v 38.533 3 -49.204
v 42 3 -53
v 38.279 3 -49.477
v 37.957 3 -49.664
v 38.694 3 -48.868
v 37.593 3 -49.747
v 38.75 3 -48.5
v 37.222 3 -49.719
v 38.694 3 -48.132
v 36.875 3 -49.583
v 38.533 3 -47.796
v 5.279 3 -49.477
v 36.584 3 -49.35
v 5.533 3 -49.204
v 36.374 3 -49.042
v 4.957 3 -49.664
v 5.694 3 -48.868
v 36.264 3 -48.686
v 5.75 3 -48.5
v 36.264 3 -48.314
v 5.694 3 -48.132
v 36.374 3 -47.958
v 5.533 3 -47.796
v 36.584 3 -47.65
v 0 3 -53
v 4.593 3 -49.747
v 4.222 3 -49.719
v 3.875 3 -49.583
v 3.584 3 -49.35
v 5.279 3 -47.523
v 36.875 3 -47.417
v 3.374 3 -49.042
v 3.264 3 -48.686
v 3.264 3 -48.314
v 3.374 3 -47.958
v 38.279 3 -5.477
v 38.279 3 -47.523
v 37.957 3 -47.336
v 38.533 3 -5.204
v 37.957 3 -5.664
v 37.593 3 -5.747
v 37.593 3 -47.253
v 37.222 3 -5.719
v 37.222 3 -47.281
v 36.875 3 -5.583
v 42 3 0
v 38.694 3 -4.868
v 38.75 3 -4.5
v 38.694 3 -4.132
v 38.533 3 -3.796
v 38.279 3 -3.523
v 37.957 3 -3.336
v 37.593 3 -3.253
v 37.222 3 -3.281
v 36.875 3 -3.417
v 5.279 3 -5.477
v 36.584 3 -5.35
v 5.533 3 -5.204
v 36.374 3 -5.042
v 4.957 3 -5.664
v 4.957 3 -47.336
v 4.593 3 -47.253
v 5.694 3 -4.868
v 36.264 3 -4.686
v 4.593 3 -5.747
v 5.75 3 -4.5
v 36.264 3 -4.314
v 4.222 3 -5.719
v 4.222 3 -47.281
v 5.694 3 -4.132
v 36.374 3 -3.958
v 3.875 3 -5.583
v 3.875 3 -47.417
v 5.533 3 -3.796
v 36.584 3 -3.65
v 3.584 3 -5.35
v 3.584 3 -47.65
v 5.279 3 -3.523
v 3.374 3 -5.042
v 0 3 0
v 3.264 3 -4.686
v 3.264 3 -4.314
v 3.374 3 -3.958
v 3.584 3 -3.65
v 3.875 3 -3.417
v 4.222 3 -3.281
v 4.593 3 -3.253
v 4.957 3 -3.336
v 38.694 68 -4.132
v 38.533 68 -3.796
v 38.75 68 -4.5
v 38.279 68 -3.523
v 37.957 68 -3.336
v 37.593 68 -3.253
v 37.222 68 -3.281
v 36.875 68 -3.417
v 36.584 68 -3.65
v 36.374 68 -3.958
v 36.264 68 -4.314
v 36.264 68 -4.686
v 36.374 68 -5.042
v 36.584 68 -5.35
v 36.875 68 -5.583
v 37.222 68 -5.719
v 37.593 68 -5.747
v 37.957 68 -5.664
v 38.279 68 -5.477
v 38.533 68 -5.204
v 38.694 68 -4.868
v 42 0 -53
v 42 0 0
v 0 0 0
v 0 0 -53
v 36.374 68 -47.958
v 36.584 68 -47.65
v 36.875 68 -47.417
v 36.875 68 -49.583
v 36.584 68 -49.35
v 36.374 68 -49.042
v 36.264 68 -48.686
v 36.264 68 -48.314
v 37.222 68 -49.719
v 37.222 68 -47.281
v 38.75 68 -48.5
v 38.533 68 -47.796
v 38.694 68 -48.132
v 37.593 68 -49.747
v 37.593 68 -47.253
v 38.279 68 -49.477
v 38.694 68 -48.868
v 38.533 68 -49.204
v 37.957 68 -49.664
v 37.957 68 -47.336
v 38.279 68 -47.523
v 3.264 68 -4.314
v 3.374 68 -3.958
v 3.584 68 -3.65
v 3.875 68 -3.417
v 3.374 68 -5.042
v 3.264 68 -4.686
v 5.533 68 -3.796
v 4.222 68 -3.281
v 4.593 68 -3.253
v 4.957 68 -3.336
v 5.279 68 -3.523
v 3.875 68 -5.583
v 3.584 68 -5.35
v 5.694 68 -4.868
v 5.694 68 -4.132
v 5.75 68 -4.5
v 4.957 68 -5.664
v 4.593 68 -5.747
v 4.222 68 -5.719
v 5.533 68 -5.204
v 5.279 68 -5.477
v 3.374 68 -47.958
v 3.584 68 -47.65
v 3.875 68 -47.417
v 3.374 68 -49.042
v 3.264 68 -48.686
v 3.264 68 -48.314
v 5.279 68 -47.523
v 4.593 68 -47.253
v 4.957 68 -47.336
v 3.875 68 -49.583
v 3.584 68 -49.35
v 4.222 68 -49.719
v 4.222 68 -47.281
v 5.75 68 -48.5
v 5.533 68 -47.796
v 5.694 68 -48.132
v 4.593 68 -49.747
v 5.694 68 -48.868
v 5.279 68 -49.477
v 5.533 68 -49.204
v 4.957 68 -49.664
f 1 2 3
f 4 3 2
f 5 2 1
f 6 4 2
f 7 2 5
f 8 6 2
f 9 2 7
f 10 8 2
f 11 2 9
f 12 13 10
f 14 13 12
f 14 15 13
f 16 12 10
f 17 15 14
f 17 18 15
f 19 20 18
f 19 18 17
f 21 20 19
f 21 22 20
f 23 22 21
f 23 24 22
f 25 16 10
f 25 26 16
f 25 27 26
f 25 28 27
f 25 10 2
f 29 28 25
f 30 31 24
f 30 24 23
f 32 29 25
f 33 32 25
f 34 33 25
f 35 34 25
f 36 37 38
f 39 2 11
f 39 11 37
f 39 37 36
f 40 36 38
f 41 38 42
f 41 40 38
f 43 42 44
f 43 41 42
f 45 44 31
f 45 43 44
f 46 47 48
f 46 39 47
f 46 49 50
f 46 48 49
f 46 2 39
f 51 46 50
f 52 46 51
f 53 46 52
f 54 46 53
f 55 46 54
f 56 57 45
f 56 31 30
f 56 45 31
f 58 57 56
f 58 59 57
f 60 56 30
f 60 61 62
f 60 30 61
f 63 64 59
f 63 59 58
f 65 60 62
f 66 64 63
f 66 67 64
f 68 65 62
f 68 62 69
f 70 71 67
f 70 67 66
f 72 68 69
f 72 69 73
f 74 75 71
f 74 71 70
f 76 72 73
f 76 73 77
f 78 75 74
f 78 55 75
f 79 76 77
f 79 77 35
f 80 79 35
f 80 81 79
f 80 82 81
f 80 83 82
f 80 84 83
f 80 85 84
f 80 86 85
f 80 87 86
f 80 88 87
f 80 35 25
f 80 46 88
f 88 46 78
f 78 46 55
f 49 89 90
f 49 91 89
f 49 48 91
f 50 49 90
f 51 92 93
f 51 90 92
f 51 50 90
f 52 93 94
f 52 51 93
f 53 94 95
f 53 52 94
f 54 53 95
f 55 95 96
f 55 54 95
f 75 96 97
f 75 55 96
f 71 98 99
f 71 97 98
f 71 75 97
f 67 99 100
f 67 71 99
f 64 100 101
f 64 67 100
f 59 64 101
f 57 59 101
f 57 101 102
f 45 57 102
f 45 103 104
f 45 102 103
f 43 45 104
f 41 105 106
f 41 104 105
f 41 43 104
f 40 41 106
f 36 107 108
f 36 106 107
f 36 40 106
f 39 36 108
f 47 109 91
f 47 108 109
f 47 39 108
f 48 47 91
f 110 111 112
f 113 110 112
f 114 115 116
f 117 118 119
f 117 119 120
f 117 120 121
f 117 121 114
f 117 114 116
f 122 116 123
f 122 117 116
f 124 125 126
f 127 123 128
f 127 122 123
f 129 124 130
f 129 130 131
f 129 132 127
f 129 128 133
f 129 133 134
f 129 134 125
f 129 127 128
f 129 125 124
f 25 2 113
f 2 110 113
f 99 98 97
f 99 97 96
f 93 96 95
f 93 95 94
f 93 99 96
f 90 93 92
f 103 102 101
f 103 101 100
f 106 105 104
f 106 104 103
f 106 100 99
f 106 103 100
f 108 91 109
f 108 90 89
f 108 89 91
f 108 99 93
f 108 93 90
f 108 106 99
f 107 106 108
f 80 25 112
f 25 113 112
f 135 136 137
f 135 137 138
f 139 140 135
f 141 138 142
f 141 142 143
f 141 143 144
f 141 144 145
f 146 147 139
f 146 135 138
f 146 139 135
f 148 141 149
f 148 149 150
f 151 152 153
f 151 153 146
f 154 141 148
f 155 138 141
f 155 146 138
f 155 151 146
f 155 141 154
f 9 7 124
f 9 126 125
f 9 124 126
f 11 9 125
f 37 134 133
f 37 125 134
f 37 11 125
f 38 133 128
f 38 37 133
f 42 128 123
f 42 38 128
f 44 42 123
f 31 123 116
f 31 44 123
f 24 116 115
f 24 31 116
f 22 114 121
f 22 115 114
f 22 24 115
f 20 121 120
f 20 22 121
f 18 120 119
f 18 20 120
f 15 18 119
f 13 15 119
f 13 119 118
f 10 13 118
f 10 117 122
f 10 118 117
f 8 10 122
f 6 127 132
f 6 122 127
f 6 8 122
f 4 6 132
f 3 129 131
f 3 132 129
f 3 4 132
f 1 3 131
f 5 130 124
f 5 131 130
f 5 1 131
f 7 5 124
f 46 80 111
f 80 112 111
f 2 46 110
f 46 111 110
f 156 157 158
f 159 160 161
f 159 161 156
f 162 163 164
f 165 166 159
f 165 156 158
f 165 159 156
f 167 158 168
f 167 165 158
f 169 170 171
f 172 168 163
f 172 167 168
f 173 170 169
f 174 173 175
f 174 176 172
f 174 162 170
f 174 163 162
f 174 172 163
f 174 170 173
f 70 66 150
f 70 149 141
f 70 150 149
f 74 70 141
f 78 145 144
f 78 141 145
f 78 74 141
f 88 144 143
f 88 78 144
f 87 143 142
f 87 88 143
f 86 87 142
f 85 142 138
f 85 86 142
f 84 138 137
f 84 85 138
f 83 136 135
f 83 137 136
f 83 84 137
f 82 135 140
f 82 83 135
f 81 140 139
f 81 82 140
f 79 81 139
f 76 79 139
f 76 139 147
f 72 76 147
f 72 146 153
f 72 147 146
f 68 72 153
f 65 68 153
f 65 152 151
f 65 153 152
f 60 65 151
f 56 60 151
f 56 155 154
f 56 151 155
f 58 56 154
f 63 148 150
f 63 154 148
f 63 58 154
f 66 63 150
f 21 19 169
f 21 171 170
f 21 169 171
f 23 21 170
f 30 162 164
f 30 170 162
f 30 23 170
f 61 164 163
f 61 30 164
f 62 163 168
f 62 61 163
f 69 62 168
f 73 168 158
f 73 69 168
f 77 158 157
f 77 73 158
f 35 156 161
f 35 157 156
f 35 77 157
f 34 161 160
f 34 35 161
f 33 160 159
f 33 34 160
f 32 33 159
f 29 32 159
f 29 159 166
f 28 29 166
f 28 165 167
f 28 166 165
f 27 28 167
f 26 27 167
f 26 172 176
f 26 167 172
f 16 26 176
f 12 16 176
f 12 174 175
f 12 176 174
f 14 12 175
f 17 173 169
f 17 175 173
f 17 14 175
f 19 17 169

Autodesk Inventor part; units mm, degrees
ref_plane "YZ Plane" through (0, 0, 0) normal (1, 0, 0) x (0, 1, 0)
ref_plane "XZ Plane" through (0, 0, 0) normal (0, 1, 0) x (-1, 0, 0)
ref_plane "XY Plane" through (0, 0, 0) normal (0, 0, 1) x (1, 0, 0)
sketch "Boceto1" plane through (0, 0, 0) normal (0, 1, 0) x (-1, 0, 0)
  line L0 (0, 0) -> (-42, 0)
  line L1 (-42, 0) -> (-42, -53)
  line L2 (-42, -53) -> (0, -53)
  line L3 (0, -53) -> (0, 0)
  circle A0 centre (-4.5, -4.5) radius 1.25
  circle A1 centre (-4.5, -48.5) radius 1.25
  circle A2 centre (-37.5, -48.5) radius 1.25
  circle A3 centre (-37.5, -4.5) radius 1.25
  line L4 (-36.25, -48.5) -> (-5.75, -48.5)
  line L5 (-4.5, -47.25) -> (-4.5, -5.75)
  line L6 (-5.75, -4.5) -> (-36.25, -4.5)
  line L7 (-37.5, -5.75) -> (-37.5, -47.25)
  dimension "d0" = 42
  dimension "d1" = 53
  dimension "d2" = 2.5
  dimension "d4" = 2.5
  dimension "d6" = 2.5
  dimension "d7" = 2.5
extrude "Extrusión1" add sketch "Boceto1" along normal blind 3 contours L3 L2 L1 L0 | A0 | A0 L5 A1 L4 A2 L7 A3 L6 | A3 | A1 | A2
sketch "Boceto2" plane through (0, 3, 0) normal (0, 1, 0) x (1, 0, 0)
  circle A0 centre (4.5, 4.5) radius 1.25 projected
  circle A1 centre (4.5, 4.5) radius 1.25
  circle A2 centre (4.5, 48.5) radius 1.25 projected
  circle A3 centre (4.5, 48.5) radius 1.25
  circle A4 centre (37.5, 48.5) radius 1.25 projected
  circle A5 centre (37.5, 48.5) radius 1.25
  circle A6 centre (37.5, 4.5) radius 1.25 projected
  circle A7 centre (37.5, 4.5) radius 1.25
  point P0 (0, 0)
extrude "Extrusión2" add sketch "Boceto2" along normal blind 65
properties part number "Relé - columnes"
